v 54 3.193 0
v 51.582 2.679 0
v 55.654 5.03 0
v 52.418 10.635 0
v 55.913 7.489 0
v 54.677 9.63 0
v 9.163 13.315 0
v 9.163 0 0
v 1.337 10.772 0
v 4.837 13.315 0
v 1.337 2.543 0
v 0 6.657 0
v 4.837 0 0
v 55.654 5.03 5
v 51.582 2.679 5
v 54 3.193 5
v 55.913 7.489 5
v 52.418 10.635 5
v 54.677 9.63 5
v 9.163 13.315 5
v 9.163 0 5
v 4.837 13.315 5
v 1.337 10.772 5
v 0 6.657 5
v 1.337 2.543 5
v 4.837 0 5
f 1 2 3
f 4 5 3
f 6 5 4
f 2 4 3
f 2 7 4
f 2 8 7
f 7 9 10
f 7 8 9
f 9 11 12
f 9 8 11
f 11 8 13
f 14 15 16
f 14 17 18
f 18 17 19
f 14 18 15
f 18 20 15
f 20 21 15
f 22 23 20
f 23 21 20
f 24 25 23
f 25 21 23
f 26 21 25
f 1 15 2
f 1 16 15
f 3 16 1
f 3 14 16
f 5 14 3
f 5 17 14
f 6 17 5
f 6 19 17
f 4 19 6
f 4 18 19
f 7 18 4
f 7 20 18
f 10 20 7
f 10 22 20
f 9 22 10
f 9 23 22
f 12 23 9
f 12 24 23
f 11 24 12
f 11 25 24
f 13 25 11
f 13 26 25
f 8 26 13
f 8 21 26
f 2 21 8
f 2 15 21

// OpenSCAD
$fn = 32;

// ----------------------------------------------------------------------
// Lever arm: two bosses 14 and 8 mm, 45 mm between centres
// ----------------------------------------------------------------------

// --- parameters (mm) ---
profile_height = 5;       // extrusion height
profile_points = 13;      // points of the closed outline

profile = [[0, 6.657], [1.337, 2.543], [4.837, 0], [9.163, 0], [51.582, 2.679], [54, 3.193], [55.654, 5.03], [55.913, 7.489], [54.677, 9.63], [52.418, 10.635], [9.163, 13.315], [4.837, 13.315], [1.337, 10.772]];  // single closed polygon, 13 points, counter clockwise

// --- the one profile operation ---
linear_extrude(height = profile_height) polygon(points = profile);
